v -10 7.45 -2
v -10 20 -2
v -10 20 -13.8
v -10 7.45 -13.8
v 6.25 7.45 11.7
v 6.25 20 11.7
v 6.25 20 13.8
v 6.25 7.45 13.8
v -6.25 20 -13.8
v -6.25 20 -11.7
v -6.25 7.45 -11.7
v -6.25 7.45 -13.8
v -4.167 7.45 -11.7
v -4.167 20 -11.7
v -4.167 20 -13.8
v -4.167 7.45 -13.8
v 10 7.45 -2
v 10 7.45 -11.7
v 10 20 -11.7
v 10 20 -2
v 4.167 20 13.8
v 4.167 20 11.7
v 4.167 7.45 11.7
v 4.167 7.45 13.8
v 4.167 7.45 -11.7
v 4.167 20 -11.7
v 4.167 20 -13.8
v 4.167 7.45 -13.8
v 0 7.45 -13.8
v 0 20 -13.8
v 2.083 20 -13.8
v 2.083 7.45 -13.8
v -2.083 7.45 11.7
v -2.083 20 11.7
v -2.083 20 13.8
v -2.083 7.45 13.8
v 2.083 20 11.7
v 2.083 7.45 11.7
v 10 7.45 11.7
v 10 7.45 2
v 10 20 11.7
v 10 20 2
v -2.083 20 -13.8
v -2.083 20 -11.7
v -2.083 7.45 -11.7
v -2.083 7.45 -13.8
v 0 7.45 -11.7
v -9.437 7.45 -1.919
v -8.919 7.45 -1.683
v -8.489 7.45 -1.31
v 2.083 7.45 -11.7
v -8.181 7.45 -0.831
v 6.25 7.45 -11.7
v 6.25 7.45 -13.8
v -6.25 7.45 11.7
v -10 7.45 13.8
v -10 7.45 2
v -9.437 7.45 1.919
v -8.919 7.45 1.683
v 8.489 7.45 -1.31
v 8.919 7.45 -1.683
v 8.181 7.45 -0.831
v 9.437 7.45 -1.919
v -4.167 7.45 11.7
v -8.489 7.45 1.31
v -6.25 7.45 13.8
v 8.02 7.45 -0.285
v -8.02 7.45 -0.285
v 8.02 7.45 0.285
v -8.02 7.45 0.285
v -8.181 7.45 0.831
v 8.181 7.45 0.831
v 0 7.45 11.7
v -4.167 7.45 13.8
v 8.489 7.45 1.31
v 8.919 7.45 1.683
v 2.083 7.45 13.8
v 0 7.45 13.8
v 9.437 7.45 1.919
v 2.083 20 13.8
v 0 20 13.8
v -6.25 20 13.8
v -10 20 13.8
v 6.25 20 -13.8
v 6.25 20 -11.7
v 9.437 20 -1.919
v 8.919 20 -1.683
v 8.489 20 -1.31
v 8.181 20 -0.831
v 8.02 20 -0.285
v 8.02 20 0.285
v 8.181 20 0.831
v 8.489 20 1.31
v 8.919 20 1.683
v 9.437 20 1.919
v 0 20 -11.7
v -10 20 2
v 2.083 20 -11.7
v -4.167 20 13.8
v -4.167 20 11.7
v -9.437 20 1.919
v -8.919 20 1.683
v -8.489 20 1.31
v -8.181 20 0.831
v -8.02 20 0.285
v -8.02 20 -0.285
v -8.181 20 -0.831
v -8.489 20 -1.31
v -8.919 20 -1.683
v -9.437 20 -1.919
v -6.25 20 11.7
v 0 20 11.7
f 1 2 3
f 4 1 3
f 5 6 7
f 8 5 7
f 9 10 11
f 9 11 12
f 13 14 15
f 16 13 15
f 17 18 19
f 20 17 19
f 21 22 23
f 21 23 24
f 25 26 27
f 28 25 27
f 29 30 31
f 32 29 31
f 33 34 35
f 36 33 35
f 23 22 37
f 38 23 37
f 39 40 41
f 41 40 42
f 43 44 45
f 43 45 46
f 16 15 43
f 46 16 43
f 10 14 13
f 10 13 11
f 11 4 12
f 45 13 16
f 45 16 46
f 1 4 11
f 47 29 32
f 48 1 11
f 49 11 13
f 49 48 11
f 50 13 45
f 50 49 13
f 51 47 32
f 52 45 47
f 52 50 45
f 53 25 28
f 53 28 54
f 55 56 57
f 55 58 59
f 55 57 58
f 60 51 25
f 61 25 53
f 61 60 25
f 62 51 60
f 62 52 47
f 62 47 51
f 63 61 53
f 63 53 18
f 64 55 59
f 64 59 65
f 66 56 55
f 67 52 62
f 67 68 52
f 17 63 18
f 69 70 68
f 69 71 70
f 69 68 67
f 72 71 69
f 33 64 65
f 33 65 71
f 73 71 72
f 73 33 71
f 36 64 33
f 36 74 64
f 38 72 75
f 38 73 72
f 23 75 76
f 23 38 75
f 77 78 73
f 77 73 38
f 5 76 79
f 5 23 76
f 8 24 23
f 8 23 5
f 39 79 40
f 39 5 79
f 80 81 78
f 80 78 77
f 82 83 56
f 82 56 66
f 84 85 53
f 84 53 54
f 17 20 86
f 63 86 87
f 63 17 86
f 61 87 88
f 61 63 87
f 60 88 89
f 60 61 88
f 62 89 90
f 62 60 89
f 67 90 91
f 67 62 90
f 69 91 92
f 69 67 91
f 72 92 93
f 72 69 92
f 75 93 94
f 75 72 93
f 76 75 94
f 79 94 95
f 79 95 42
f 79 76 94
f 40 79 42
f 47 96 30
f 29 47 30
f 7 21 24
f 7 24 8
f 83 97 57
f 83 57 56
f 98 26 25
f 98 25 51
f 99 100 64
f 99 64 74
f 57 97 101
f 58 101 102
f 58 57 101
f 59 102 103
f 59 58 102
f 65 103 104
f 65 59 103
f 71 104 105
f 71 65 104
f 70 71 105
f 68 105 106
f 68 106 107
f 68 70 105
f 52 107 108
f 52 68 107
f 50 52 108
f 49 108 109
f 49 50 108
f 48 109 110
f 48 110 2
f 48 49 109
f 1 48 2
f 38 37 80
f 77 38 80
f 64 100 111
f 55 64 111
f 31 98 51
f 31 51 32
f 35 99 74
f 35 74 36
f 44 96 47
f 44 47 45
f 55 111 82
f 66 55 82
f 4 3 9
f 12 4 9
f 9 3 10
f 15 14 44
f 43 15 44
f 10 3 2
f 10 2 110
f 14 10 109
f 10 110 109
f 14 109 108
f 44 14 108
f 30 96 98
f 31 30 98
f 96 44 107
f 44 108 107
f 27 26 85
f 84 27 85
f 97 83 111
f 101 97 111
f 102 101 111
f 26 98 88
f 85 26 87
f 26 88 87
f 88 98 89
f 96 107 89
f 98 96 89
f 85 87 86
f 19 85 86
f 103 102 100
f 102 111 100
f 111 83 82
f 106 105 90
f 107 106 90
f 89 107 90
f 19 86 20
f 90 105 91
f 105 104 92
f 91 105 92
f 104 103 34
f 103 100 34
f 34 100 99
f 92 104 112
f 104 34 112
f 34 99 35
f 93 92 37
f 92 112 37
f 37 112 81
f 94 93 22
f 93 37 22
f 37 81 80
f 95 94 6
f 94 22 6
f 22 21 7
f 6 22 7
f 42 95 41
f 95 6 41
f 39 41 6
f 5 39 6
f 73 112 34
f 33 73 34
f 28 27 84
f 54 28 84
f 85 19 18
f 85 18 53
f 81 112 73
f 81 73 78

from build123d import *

# Parameters (mm, degrees)
SKETCH1_W           = 40
SKETCH1_H           = 29.4
SKETCH1_R           = 2
BOSS_EXTRUDE1_DEPTH = 20
SKETCH2_W           = 20
SKETCH2_H           = 12.55
CUT_EXTRUDE1_DEPTH  = 3
CUT_EXTRUDE2_REACH  = 42.797
SKETCH2_3_W         = 10
SKETCH2_3_H         = 20
BOSS_EXTRUDE2_REACH = 28.76
SKETCH4_W           = 2.083333333
SKETCH4_H           = 2.1
SKETCH4_W_2         = 2.083333334
SKETCH4_W_3         = 3.75
SKETCH5_W           = 20
SKETCH5_H           = 29.4
CUT_EXTRUDE3_DEPTH  = 7.45


with BuildPart() as part:
    # Sketch1 → Boss-Extrude1 (new body)
    with BuildSketch(Plane(origin=(0, 0, 0), x_dir=(1, 0, 0), z_dir=(0, 1, 0))):
        Rectangle(SKETCH1_W, SKETCH1_H)
        with Locations(Location((-10, 0, 0), (0, 0, 270))):
            Circle(SKETCH1_R, mode=Mode.SUBTRACT)
        with Locations(Location((10, 0, 0), (0, 0, 270))):
            Circle(SKETCH1_R, mode=Mode.SUBTRACT)
    extrude(amount=BOSS_EXTRUDE1_DEPTH)

    # Sketch2 → Cut-Extrude1 (cut)
    with BuildSketch(Plane(origin=(0, 0, -14.7), x_dir=(-1, 0, 0), z_dir=(0, 0, -1))):
        with Locations((0, 13.725)):
            Rectangle(SKETCH2_W, SKETCH2_H)
    cut_extrude1 = extrude(amount=-CUT_EXTRUDE1_DEPTH, mode=Mode.SUBTRACT)

    # Mirror1: Cut-Extrude1 across plane
    add(cut_extrude1.mirror(Plane.XY), mode=Mode.SUBTRACT)

    # Sketch2<3> → Cut-Extrude2 (cut, up to next)
    with BuildSketch(Plane(origin=(0, 0, -14.7), x_dir=(-1, 0, 0), z_dir=(0, 0, -1)), mode=Mode.PRIVATE) as cut_extrude2_sk1:
        with Locations((-15, 10)):
            Rectangle(SKETCH2_3_W, SKETCH2_3_H)
    cut_extrude2_tool1 = extrude(cut_extrude2_sk1.sketch, amount=-CUT_EXTRUDE2_REACH, mode=Mode.PRIVATE) & part.part
    # Sketch2<3> → Cut-Extrude2 (cut, up to next)
    with BuildSketch(Plane(origin=(0, 0, -14.7), x_dir=(-1, 0, 0), z_dir=(0, 0, -1)), mode=Mode.PRIVATE) as cut_extrude2_sk2:
        with Locations((15, 10)):
            Rectangle(SKETCH2_3_W, SKETCH2_3_H)
    cut_extrude2_tool2 = extrude(cut_extrude2_sk2.sketch, amount=-CUT_EXTRUDE2_REACH, mode=Mode.PRIVATE) & part.part
    add(cut_extrude2_tool1.solids().sort_by_distance((15, 10, -14.7))[0], mode=Mode.SUBTRACT)
    add(cut_extrude2_tool2.solids().sort_by_distance((-15, 10, -14.7))[0], mode=Mode.SUBTRACT)

    # Sketch4 → Boss-Extrude2 (add, up to next)
    with BuildSketch(Plane(origin=(0, 20, 0), x_dir=(1, 0, 0), z_dir=(0, 1, 0)), mode=Mode.PRIVATE) as boss_extrude2_sk1:
        with Locations((5.208333334, 12.75)):
            Rectangle(SKETCH4_W, SKETCH4_H)
    boss_extrude2_tool1 = extrude(boss_extrude2_sk1.sketch, amount=-BOSS_EXTRUDE2_REACH, mode=Mode.PRIVATE) - part.part
    # Sketch4 → Boss-Extrude2 (add, up to next)
    with BuildSketch(Plane(origin=(0, 20, 0), x_dir=(1, 0, 0), z_dir=(0, 1, 0)), mode=Mode.PRIVATE) as boss_extrude2_sk2:
        with Locations((1.041666667, 12.75)):
            Rectangle(SKETCH4_W, SKETCH4_H)
    boss_extrude2_tool2 = extrude(boss_extrude2_sk2.sketch, amount=-BOSS_EXTRUDE2_REACH, mode=Mode.PRIVATE) - part.part
    # Sketch4 → Boss-Extrude2 (add, up to next)
    with BuildSketch(Plane(origin=(0, 20, 0), x_dir=(1, 0, 0), z_dir=(0, 1, 0)), mode=Mode.PRIVATE) as boss_extrude2_sk3:
        with Locations((-3.125, 12.75)):
            Rectangle(SKETCH4_W_2, SKETCH4_H)
    boss_extrude2_tool3 = extrude(boss_extrude2_sk3.sketch, amount=-BOSS_EXTRUDE2_REACH, mode=Mode.PRIVATE) - part.part
    # Sketch4 → Boss-Extrude2 (add, up to next)
    with BuildSketch(Plane(origin=(0, 20, 0), x_dir=(1, 0, 0), z_dir=(0, 1, 0)), mode=Mode.PRIVATE) as boss_extrude2_sk4:
        with Locations((-8.125, 12.75)):
            Rectangle(SKETCH4_W_3, SKETCH4_H)
    boss_extrude2_tool4 = extrude(boss_extrude2_sk4.sketch, amount=-BOSS_EXTRUDE2_REACH, mode=Mode.PRIVATE) - part.part
    boss_extrude2_1 = boss_extrude2_tool1.solids().sort_by_distance((5.208333, 20, -12.75))[0]
    add(boss_extrude2_1)
    boss_extrude2_2 = boss_extrude2_tool2.solids().sort_by_distance((1.041667, 20, -12.75))[0]
    add(boss_extrude2_2)
    boss_extrude2_3 = boss_extrude2_tool3.solids().sort_by_distance((-3.125, 20, -12.75))[0]
    add(boss_extrude2_3)
    boss_extrude2_4 = boss_extrude2_tool4.solids().sort_by_distance((-8.125, 20, -12.75))[0]
    add(boss_extrude2_4)
    boss_extrude2 = boss_extrude2_1 + boss_extrude2_2 + boss_extrude2_3 + boss_extrude2_4  # Boss-Extrude2 as one shape, for the pattern or mirror that repeats it

    # Mirror2: Boss-Extrude2 across plane
    add(boss_extrude2.mirror(Plane.XY))

    # Sketch5 → Cut-Extrude3 (cut)
    with BuildSketch(Plane.XZ):
        Rectangle(SKETCH5_W, SKETCH5_H)
    extrude(amount=-CUT_EXTRUDE3_DEPTH, mode=Mode.SUBTRACT)


solid = part.part
